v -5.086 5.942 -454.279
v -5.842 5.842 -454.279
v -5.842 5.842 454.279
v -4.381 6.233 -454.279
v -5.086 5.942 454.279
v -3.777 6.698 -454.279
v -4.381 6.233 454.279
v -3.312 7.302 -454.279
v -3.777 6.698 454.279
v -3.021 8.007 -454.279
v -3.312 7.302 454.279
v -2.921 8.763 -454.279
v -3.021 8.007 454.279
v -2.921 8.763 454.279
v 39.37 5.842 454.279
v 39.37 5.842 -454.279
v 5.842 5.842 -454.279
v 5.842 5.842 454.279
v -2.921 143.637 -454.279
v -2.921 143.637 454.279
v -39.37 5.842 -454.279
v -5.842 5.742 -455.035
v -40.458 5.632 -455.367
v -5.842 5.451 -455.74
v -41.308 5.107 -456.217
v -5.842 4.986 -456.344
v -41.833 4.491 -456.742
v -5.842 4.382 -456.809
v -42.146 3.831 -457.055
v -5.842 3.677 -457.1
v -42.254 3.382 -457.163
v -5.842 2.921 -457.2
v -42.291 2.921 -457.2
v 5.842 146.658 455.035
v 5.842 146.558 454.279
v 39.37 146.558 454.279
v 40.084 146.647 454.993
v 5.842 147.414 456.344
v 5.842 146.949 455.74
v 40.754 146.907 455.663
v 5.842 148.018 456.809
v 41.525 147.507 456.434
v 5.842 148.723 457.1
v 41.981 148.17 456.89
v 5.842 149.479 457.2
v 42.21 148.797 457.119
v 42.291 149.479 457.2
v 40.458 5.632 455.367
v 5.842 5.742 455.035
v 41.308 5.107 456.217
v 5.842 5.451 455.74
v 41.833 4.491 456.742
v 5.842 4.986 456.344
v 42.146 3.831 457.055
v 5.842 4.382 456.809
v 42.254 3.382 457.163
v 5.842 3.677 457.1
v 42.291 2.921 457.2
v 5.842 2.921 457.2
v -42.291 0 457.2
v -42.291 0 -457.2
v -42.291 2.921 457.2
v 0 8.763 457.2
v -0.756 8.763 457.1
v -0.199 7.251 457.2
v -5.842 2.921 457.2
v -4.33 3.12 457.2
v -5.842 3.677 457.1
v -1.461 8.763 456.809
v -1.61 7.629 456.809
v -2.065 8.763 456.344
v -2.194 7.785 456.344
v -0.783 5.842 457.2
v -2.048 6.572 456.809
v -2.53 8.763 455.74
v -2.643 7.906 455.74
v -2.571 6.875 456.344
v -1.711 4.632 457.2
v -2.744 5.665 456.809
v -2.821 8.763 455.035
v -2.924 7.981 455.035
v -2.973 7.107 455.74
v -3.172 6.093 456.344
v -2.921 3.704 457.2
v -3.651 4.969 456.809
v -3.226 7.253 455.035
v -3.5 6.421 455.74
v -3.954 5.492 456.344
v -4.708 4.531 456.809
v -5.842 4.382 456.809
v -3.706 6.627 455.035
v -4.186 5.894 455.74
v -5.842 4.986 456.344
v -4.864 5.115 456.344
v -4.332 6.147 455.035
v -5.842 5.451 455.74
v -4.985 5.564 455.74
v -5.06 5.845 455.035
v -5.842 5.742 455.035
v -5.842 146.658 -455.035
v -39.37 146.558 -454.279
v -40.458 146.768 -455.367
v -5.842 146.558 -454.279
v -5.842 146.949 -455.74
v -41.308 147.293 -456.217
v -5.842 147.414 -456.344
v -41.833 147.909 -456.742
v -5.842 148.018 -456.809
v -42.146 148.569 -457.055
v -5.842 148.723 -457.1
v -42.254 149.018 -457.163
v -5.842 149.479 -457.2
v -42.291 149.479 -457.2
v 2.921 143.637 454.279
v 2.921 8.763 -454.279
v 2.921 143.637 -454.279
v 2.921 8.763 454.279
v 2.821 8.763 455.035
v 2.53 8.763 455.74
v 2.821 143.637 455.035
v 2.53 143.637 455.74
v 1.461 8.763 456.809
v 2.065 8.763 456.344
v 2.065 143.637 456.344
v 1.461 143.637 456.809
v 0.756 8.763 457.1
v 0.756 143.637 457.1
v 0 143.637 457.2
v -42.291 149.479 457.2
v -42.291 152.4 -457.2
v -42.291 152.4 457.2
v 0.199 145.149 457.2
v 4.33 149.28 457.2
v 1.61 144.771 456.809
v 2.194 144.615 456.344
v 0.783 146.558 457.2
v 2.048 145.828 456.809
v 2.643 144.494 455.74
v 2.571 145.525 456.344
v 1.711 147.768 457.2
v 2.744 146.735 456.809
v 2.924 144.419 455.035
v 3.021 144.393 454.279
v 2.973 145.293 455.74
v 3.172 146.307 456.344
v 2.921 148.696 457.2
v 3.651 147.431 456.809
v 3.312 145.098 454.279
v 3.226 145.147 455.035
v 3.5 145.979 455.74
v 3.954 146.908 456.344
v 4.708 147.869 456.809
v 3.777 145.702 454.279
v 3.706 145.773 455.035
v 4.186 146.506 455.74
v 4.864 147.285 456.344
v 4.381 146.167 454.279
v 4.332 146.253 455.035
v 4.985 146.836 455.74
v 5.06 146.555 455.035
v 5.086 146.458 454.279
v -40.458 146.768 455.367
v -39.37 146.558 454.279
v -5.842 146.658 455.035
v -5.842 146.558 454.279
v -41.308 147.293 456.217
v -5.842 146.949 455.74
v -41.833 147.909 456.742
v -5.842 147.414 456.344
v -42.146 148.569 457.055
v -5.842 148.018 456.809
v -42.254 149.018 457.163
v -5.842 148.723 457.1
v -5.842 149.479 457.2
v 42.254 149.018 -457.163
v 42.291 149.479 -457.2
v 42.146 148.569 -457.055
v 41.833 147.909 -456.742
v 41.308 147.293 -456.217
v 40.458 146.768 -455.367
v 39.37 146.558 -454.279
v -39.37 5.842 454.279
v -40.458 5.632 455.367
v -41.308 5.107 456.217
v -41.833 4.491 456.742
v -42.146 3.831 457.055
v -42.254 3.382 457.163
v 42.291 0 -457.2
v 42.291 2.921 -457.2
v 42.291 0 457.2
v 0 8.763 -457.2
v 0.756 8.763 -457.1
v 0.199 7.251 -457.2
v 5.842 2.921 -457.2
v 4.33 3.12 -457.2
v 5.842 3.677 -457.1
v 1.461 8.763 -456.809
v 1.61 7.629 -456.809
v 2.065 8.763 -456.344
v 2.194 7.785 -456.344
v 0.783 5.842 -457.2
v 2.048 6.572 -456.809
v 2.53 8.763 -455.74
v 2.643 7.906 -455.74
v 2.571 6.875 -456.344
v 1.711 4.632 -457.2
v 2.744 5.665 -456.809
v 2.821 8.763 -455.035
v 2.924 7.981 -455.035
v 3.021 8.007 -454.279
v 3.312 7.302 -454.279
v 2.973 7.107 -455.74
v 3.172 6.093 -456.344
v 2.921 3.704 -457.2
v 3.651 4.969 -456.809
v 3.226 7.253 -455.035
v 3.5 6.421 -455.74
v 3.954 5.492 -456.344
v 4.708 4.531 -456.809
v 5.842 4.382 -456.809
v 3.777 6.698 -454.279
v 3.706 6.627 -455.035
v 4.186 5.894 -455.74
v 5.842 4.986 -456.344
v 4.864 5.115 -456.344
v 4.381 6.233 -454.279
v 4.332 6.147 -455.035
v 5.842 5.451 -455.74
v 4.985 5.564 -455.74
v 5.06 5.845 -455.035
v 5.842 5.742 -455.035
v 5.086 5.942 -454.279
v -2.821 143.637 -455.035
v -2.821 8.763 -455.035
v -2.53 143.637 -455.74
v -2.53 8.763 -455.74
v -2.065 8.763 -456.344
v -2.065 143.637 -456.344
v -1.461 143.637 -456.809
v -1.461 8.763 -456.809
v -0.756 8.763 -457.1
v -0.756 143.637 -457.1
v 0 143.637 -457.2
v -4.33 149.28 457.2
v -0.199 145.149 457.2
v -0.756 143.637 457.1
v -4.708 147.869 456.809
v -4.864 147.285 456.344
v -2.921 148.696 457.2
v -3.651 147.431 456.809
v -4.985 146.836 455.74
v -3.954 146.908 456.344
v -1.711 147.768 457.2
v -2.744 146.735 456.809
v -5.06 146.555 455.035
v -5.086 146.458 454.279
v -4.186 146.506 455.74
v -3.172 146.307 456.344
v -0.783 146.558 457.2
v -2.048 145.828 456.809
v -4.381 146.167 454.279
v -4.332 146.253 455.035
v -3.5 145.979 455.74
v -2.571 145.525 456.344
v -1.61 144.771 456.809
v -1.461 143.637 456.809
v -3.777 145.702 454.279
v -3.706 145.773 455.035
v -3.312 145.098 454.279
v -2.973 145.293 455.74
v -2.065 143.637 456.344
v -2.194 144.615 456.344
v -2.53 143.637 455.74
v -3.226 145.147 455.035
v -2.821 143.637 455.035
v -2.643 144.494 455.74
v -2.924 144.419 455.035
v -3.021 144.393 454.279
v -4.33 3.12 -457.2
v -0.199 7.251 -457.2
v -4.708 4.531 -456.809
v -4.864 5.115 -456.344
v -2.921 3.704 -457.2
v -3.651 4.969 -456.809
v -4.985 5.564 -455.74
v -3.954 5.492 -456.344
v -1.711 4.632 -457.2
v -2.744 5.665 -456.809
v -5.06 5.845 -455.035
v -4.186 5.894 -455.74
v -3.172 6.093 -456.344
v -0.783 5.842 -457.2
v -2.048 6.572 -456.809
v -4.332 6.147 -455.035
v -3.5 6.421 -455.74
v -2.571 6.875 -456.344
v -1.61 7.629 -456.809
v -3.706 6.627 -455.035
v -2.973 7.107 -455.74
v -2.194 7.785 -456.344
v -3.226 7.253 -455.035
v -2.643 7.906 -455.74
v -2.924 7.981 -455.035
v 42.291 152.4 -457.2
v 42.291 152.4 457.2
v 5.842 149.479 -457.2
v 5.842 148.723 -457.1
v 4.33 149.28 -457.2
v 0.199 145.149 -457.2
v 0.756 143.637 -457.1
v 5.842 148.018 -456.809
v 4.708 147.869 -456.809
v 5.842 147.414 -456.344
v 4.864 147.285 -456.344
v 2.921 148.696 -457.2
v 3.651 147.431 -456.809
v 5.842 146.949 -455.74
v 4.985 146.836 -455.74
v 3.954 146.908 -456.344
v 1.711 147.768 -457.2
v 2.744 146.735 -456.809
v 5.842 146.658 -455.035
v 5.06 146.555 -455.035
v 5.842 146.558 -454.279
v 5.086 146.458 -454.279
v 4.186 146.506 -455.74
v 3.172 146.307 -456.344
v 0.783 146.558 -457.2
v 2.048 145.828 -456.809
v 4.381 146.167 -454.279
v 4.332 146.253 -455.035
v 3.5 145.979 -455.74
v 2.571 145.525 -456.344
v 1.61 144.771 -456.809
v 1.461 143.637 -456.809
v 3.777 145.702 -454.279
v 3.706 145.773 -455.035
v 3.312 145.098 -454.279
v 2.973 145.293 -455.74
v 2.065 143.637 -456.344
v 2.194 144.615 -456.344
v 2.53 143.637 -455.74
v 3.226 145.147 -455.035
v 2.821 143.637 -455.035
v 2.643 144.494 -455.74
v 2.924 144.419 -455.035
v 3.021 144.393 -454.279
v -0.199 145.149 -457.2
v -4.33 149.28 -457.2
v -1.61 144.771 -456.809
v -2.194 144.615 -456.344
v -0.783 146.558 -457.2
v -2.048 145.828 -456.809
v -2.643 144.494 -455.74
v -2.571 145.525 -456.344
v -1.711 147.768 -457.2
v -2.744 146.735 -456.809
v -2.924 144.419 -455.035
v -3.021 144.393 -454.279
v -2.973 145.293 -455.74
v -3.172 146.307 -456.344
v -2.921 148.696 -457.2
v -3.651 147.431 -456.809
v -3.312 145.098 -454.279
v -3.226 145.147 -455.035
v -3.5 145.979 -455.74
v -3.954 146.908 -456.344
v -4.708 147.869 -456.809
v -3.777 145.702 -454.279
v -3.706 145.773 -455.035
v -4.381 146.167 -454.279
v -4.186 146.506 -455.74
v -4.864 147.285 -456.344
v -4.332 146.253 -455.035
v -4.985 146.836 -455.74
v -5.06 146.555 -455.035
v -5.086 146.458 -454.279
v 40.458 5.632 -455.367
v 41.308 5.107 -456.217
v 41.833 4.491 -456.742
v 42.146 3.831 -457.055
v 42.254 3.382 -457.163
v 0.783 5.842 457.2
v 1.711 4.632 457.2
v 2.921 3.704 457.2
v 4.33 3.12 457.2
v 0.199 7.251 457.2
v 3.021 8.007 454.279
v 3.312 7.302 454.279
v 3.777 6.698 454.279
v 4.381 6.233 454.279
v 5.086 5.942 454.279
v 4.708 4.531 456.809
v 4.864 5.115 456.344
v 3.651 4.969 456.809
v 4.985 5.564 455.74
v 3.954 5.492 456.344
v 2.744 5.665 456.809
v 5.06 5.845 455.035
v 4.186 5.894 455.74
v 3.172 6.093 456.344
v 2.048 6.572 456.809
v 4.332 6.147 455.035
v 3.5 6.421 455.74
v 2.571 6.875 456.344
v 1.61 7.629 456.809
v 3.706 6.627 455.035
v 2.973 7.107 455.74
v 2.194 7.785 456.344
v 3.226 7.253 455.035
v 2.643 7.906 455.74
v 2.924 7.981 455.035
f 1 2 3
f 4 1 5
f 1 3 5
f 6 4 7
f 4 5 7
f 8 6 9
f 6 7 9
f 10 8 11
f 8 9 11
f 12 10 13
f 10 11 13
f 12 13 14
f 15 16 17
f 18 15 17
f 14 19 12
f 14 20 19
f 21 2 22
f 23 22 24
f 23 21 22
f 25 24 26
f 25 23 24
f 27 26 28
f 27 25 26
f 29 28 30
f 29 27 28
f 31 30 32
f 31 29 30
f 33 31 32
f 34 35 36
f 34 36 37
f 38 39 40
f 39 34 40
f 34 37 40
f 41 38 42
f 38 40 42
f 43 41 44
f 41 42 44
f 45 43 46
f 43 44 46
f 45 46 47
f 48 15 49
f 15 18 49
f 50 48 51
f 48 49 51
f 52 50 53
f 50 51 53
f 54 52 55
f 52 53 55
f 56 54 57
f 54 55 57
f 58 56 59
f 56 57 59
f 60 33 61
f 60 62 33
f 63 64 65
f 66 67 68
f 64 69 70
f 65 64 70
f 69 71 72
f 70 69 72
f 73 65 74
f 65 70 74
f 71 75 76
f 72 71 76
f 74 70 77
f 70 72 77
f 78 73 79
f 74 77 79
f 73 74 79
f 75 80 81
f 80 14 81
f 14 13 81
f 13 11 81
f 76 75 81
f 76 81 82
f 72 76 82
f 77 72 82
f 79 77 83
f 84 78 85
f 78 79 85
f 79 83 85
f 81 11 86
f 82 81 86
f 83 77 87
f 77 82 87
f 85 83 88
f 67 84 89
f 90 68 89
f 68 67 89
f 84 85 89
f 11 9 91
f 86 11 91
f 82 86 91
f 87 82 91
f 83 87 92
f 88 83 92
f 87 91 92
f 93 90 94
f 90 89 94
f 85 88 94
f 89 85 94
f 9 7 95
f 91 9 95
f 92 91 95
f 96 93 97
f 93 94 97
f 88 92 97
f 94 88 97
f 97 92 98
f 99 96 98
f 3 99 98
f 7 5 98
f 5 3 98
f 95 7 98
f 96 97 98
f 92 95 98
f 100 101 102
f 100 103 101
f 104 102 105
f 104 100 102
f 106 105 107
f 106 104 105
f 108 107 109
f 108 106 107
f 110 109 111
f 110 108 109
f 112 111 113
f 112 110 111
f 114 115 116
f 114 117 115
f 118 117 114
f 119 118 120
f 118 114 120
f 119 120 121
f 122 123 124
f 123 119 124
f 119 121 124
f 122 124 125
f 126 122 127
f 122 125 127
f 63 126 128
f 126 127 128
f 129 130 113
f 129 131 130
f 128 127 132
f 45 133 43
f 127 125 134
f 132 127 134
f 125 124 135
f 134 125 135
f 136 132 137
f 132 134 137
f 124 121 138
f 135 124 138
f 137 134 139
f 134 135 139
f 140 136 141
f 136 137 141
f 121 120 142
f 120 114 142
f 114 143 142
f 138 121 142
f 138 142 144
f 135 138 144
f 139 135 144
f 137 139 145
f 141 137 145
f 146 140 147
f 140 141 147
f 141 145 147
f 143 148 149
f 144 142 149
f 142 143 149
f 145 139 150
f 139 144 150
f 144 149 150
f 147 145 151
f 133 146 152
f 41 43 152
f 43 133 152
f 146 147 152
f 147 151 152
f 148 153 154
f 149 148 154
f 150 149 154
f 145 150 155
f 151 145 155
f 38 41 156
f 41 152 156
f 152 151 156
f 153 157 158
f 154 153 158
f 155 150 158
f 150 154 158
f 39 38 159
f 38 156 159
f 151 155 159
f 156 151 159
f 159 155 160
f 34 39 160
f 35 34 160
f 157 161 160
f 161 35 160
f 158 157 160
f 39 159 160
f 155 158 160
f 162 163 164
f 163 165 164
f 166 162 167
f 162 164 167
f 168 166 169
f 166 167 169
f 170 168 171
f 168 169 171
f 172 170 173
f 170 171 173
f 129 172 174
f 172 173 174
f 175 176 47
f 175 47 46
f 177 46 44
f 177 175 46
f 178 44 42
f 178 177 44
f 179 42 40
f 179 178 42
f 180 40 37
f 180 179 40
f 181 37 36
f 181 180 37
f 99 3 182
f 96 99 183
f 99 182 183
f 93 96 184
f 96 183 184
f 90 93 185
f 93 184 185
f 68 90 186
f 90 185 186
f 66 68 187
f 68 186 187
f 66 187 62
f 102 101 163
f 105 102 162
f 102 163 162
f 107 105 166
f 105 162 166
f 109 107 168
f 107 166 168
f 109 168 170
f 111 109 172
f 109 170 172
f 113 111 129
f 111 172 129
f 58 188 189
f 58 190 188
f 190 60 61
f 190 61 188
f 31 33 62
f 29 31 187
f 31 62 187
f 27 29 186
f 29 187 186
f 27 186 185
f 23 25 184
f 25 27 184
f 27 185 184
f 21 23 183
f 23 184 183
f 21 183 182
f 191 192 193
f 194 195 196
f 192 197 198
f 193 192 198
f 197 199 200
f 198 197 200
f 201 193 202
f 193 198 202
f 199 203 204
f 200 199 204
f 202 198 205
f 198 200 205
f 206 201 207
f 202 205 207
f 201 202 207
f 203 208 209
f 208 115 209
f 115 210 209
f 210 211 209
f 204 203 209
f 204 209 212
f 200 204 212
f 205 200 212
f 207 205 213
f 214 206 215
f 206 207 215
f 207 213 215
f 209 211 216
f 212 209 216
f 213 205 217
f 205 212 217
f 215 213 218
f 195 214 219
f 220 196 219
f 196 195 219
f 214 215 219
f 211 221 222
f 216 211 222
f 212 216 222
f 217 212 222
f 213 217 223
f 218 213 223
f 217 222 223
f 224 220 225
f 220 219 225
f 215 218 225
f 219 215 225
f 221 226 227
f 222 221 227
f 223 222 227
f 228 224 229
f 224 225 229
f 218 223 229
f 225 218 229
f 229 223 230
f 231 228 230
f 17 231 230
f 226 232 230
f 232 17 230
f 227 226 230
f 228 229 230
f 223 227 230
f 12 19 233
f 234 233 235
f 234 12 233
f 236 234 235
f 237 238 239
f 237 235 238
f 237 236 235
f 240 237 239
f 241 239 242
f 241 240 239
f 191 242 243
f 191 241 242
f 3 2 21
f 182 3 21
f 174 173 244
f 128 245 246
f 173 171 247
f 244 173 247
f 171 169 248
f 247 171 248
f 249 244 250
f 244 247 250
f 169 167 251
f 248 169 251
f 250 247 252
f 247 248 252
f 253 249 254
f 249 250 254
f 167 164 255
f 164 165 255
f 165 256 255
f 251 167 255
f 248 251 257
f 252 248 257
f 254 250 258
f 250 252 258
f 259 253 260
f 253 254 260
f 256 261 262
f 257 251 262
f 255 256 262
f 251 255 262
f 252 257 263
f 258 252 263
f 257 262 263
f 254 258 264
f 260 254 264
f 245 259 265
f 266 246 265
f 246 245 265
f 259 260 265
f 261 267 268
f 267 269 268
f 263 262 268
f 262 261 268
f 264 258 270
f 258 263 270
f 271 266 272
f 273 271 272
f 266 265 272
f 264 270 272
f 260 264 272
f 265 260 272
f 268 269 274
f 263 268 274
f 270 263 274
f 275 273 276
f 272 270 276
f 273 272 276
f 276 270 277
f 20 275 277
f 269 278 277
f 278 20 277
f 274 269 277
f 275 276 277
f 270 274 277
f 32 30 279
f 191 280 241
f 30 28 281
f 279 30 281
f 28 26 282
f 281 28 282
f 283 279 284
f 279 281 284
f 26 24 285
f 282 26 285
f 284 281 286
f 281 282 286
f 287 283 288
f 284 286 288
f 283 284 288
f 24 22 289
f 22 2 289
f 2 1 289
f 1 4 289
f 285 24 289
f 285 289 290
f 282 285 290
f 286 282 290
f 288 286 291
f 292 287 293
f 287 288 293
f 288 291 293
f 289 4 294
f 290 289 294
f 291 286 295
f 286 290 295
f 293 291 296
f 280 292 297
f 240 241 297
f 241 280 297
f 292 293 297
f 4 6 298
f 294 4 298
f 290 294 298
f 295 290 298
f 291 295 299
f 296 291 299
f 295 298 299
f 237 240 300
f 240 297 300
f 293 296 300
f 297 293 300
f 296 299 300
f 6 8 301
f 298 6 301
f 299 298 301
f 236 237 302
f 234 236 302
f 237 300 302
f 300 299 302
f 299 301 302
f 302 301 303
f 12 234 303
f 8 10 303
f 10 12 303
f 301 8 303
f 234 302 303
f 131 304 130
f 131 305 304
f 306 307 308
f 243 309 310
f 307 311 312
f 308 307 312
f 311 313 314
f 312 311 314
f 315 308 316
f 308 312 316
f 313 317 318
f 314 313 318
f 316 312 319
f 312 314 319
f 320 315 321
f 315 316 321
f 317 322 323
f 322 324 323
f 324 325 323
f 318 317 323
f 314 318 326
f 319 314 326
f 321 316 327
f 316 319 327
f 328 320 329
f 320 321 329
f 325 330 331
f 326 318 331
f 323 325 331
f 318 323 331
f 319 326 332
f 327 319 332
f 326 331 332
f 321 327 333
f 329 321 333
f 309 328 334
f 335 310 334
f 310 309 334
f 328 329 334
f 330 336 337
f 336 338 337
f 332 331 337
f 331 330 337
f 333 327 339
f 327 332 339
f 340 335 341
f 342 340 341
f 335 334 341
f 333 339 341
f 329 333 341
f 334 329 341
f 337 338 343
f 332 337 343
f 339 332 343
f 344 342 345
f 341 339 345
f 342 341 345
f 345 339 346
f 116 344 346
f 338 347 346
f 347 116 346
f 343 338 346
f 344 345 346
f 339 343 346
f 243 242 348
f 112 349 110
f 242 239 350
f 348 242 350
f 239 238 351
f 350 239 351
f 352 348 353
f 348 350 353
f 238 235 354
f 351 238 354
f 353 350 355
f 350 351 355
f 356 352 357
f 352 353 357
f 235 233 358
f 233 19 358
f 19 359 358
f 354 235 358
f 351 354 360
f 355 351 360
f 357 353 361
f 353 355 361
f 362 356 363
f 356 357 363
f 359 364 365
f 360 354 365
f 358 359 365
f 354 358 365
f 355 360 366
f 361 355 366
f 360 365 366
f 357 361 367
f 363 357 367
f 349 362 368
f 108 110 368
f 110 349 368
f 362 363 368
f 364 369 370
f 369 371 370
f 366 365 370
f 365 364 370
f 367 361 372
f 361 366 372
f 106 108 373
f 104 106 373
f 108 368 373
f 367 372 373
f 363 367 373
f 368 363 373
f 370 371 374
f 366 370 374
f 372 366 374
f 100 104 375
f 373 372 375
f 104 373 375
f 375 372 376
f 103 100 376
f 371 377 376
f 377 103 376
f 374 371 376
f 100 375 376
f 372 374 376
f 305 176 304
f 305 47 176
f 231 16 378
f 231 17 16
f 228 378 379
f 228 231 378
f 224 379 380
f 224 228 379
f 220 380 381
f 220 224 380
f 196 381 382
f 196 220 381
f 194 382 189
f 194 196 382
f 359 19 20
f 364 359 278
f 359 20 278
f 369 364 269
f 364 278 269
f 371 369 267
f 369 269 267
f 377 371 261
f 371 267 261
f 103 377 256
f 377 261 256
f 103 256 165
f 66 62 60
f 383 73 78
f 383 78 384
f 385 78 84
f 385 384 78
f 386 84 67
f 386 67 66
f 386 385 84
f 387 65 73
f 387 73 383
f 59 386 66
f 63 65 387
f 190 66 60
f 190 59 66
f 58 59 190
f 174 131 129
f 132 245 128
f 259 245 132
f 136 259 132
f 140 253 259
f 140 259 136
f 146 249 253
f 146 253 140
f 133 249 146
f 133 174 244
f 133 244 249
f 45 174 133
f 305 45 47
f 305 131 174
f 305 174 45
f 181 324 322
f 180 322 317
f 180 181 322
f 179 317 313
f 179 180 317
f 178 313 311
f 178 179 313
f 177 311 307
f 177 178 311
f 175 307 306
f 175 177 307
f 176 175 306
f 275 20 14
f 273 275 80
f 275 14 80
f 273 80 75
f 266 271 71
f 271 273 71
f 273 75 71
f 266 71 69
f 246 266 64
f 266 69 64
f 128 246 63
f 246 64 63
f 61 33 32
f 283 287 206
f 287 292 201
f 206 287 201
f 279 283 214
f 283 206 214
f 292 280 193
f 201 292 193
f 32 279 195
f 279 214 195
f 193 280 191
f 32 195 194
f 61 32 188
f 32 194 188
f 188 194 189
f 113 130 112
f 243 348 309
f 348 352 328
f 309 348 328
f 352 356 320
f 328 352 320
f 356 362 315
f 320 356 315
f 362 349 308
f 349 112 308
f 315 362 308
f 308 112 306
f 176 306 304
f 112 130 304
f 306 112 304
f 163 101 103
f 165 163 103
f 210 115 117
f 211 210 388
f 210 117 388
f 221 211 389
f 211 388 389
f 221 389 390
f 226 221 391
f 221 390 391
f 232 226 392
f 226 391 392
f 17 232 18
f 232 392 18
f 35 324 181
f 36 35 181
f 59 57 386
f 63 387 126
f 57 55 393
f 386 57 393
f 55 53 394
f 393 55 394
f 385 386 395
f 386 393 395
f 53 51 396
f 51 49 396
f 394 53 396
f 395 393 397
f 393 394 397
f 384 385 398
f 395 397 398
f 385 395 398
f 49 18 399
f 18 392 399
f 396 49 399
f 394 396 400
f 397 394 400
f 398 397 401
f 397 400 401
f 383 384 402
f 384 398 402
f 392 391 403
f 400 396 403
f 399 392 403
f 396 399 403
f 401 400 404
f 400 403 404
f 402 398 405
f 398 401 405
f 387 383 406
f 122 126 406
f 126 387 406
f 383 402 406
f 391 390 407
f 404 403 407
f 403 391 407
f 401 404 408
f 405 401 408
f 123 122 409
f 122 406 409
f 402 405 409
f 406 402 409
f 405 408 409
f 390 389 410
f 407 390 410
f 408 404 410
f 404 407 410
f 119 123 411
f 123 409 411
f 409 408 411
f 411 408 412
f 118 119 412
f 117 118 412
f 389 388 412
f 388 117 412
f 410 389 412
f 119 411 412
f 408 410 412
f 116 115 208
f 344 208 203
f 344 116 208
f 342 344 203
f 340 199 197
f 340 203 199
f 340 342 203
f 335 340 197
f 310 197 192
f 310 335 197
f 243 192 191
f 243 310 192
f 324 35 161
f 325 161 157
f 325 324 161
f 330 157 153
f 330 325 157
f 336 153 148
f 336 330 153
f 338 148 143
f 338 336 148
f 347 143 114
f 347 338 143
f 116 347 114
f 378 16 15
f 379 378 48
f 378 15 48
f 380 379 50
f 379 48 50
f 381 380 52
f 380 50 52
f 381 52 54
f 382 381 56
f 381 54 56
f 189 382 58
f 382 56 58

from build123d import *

# Parameters (mm, degrees)
BOSS_EXTRUDE1_DEPTH = 457.2
FILLET1_R           = 2.921


with BuildPart() as part:
    # Sketch1 → Boss-Extrude1 (new, symmetric)
    with BuildSketch(Plane.XY):
        Polygon((42.291, 152.4), (-42.291, 152.4), (-42.291, 146.558), (-2.921, 146.558), (-2.921, 5.842), (-42.291, 5.842), (-42.291, 0), (42.291, 0), (42.291, 5.842), (2.921, 5.842), (2.921, 146.558), (42.291, 146.558), align=None)
    extrude(amount=BOSS_EXTRUDE1_DEPTH, both=True)

    # Fillet1
    fillet1_edges = [part.edges().sort_by_distance(p)[0] for p in [
        (22.606, 146.558, -457.2),
        (2.921, 76.2, -457.2),
        (22.606, 5.842, -457.2),
        (-22.606, 146.558, 457.2),
        (-22.606, 5.842, -457.2),
        (-2.921, 76.2, -457.2),
        (-22.606, 146.558, -457.2),
        (-2.921, 76.2, 457.2),
        (-22.606, 5.842, 457.2),
        (42.291, 146.558, 0),
        (2.921, 146.558, 0),
        (2.921, 5.842, 0),
        (42.291, 5.842, 0),
        (-42.291, 5.842, 0),
        (-2.921, 5.842, 0),
        (-2.921, 146.558, 0),
        (-42.291, 146.558, 0),
        (22.606, 5.842, 457.2),
        (2.921, 76.2, 457.2),
        (22.606, 146.558, 457.2),
    ]]
    fillet(fillet1_edges, radius=FILLET1_R - 0.0001)  # a hair under: the kernel refuses the full size


solid = part.part
